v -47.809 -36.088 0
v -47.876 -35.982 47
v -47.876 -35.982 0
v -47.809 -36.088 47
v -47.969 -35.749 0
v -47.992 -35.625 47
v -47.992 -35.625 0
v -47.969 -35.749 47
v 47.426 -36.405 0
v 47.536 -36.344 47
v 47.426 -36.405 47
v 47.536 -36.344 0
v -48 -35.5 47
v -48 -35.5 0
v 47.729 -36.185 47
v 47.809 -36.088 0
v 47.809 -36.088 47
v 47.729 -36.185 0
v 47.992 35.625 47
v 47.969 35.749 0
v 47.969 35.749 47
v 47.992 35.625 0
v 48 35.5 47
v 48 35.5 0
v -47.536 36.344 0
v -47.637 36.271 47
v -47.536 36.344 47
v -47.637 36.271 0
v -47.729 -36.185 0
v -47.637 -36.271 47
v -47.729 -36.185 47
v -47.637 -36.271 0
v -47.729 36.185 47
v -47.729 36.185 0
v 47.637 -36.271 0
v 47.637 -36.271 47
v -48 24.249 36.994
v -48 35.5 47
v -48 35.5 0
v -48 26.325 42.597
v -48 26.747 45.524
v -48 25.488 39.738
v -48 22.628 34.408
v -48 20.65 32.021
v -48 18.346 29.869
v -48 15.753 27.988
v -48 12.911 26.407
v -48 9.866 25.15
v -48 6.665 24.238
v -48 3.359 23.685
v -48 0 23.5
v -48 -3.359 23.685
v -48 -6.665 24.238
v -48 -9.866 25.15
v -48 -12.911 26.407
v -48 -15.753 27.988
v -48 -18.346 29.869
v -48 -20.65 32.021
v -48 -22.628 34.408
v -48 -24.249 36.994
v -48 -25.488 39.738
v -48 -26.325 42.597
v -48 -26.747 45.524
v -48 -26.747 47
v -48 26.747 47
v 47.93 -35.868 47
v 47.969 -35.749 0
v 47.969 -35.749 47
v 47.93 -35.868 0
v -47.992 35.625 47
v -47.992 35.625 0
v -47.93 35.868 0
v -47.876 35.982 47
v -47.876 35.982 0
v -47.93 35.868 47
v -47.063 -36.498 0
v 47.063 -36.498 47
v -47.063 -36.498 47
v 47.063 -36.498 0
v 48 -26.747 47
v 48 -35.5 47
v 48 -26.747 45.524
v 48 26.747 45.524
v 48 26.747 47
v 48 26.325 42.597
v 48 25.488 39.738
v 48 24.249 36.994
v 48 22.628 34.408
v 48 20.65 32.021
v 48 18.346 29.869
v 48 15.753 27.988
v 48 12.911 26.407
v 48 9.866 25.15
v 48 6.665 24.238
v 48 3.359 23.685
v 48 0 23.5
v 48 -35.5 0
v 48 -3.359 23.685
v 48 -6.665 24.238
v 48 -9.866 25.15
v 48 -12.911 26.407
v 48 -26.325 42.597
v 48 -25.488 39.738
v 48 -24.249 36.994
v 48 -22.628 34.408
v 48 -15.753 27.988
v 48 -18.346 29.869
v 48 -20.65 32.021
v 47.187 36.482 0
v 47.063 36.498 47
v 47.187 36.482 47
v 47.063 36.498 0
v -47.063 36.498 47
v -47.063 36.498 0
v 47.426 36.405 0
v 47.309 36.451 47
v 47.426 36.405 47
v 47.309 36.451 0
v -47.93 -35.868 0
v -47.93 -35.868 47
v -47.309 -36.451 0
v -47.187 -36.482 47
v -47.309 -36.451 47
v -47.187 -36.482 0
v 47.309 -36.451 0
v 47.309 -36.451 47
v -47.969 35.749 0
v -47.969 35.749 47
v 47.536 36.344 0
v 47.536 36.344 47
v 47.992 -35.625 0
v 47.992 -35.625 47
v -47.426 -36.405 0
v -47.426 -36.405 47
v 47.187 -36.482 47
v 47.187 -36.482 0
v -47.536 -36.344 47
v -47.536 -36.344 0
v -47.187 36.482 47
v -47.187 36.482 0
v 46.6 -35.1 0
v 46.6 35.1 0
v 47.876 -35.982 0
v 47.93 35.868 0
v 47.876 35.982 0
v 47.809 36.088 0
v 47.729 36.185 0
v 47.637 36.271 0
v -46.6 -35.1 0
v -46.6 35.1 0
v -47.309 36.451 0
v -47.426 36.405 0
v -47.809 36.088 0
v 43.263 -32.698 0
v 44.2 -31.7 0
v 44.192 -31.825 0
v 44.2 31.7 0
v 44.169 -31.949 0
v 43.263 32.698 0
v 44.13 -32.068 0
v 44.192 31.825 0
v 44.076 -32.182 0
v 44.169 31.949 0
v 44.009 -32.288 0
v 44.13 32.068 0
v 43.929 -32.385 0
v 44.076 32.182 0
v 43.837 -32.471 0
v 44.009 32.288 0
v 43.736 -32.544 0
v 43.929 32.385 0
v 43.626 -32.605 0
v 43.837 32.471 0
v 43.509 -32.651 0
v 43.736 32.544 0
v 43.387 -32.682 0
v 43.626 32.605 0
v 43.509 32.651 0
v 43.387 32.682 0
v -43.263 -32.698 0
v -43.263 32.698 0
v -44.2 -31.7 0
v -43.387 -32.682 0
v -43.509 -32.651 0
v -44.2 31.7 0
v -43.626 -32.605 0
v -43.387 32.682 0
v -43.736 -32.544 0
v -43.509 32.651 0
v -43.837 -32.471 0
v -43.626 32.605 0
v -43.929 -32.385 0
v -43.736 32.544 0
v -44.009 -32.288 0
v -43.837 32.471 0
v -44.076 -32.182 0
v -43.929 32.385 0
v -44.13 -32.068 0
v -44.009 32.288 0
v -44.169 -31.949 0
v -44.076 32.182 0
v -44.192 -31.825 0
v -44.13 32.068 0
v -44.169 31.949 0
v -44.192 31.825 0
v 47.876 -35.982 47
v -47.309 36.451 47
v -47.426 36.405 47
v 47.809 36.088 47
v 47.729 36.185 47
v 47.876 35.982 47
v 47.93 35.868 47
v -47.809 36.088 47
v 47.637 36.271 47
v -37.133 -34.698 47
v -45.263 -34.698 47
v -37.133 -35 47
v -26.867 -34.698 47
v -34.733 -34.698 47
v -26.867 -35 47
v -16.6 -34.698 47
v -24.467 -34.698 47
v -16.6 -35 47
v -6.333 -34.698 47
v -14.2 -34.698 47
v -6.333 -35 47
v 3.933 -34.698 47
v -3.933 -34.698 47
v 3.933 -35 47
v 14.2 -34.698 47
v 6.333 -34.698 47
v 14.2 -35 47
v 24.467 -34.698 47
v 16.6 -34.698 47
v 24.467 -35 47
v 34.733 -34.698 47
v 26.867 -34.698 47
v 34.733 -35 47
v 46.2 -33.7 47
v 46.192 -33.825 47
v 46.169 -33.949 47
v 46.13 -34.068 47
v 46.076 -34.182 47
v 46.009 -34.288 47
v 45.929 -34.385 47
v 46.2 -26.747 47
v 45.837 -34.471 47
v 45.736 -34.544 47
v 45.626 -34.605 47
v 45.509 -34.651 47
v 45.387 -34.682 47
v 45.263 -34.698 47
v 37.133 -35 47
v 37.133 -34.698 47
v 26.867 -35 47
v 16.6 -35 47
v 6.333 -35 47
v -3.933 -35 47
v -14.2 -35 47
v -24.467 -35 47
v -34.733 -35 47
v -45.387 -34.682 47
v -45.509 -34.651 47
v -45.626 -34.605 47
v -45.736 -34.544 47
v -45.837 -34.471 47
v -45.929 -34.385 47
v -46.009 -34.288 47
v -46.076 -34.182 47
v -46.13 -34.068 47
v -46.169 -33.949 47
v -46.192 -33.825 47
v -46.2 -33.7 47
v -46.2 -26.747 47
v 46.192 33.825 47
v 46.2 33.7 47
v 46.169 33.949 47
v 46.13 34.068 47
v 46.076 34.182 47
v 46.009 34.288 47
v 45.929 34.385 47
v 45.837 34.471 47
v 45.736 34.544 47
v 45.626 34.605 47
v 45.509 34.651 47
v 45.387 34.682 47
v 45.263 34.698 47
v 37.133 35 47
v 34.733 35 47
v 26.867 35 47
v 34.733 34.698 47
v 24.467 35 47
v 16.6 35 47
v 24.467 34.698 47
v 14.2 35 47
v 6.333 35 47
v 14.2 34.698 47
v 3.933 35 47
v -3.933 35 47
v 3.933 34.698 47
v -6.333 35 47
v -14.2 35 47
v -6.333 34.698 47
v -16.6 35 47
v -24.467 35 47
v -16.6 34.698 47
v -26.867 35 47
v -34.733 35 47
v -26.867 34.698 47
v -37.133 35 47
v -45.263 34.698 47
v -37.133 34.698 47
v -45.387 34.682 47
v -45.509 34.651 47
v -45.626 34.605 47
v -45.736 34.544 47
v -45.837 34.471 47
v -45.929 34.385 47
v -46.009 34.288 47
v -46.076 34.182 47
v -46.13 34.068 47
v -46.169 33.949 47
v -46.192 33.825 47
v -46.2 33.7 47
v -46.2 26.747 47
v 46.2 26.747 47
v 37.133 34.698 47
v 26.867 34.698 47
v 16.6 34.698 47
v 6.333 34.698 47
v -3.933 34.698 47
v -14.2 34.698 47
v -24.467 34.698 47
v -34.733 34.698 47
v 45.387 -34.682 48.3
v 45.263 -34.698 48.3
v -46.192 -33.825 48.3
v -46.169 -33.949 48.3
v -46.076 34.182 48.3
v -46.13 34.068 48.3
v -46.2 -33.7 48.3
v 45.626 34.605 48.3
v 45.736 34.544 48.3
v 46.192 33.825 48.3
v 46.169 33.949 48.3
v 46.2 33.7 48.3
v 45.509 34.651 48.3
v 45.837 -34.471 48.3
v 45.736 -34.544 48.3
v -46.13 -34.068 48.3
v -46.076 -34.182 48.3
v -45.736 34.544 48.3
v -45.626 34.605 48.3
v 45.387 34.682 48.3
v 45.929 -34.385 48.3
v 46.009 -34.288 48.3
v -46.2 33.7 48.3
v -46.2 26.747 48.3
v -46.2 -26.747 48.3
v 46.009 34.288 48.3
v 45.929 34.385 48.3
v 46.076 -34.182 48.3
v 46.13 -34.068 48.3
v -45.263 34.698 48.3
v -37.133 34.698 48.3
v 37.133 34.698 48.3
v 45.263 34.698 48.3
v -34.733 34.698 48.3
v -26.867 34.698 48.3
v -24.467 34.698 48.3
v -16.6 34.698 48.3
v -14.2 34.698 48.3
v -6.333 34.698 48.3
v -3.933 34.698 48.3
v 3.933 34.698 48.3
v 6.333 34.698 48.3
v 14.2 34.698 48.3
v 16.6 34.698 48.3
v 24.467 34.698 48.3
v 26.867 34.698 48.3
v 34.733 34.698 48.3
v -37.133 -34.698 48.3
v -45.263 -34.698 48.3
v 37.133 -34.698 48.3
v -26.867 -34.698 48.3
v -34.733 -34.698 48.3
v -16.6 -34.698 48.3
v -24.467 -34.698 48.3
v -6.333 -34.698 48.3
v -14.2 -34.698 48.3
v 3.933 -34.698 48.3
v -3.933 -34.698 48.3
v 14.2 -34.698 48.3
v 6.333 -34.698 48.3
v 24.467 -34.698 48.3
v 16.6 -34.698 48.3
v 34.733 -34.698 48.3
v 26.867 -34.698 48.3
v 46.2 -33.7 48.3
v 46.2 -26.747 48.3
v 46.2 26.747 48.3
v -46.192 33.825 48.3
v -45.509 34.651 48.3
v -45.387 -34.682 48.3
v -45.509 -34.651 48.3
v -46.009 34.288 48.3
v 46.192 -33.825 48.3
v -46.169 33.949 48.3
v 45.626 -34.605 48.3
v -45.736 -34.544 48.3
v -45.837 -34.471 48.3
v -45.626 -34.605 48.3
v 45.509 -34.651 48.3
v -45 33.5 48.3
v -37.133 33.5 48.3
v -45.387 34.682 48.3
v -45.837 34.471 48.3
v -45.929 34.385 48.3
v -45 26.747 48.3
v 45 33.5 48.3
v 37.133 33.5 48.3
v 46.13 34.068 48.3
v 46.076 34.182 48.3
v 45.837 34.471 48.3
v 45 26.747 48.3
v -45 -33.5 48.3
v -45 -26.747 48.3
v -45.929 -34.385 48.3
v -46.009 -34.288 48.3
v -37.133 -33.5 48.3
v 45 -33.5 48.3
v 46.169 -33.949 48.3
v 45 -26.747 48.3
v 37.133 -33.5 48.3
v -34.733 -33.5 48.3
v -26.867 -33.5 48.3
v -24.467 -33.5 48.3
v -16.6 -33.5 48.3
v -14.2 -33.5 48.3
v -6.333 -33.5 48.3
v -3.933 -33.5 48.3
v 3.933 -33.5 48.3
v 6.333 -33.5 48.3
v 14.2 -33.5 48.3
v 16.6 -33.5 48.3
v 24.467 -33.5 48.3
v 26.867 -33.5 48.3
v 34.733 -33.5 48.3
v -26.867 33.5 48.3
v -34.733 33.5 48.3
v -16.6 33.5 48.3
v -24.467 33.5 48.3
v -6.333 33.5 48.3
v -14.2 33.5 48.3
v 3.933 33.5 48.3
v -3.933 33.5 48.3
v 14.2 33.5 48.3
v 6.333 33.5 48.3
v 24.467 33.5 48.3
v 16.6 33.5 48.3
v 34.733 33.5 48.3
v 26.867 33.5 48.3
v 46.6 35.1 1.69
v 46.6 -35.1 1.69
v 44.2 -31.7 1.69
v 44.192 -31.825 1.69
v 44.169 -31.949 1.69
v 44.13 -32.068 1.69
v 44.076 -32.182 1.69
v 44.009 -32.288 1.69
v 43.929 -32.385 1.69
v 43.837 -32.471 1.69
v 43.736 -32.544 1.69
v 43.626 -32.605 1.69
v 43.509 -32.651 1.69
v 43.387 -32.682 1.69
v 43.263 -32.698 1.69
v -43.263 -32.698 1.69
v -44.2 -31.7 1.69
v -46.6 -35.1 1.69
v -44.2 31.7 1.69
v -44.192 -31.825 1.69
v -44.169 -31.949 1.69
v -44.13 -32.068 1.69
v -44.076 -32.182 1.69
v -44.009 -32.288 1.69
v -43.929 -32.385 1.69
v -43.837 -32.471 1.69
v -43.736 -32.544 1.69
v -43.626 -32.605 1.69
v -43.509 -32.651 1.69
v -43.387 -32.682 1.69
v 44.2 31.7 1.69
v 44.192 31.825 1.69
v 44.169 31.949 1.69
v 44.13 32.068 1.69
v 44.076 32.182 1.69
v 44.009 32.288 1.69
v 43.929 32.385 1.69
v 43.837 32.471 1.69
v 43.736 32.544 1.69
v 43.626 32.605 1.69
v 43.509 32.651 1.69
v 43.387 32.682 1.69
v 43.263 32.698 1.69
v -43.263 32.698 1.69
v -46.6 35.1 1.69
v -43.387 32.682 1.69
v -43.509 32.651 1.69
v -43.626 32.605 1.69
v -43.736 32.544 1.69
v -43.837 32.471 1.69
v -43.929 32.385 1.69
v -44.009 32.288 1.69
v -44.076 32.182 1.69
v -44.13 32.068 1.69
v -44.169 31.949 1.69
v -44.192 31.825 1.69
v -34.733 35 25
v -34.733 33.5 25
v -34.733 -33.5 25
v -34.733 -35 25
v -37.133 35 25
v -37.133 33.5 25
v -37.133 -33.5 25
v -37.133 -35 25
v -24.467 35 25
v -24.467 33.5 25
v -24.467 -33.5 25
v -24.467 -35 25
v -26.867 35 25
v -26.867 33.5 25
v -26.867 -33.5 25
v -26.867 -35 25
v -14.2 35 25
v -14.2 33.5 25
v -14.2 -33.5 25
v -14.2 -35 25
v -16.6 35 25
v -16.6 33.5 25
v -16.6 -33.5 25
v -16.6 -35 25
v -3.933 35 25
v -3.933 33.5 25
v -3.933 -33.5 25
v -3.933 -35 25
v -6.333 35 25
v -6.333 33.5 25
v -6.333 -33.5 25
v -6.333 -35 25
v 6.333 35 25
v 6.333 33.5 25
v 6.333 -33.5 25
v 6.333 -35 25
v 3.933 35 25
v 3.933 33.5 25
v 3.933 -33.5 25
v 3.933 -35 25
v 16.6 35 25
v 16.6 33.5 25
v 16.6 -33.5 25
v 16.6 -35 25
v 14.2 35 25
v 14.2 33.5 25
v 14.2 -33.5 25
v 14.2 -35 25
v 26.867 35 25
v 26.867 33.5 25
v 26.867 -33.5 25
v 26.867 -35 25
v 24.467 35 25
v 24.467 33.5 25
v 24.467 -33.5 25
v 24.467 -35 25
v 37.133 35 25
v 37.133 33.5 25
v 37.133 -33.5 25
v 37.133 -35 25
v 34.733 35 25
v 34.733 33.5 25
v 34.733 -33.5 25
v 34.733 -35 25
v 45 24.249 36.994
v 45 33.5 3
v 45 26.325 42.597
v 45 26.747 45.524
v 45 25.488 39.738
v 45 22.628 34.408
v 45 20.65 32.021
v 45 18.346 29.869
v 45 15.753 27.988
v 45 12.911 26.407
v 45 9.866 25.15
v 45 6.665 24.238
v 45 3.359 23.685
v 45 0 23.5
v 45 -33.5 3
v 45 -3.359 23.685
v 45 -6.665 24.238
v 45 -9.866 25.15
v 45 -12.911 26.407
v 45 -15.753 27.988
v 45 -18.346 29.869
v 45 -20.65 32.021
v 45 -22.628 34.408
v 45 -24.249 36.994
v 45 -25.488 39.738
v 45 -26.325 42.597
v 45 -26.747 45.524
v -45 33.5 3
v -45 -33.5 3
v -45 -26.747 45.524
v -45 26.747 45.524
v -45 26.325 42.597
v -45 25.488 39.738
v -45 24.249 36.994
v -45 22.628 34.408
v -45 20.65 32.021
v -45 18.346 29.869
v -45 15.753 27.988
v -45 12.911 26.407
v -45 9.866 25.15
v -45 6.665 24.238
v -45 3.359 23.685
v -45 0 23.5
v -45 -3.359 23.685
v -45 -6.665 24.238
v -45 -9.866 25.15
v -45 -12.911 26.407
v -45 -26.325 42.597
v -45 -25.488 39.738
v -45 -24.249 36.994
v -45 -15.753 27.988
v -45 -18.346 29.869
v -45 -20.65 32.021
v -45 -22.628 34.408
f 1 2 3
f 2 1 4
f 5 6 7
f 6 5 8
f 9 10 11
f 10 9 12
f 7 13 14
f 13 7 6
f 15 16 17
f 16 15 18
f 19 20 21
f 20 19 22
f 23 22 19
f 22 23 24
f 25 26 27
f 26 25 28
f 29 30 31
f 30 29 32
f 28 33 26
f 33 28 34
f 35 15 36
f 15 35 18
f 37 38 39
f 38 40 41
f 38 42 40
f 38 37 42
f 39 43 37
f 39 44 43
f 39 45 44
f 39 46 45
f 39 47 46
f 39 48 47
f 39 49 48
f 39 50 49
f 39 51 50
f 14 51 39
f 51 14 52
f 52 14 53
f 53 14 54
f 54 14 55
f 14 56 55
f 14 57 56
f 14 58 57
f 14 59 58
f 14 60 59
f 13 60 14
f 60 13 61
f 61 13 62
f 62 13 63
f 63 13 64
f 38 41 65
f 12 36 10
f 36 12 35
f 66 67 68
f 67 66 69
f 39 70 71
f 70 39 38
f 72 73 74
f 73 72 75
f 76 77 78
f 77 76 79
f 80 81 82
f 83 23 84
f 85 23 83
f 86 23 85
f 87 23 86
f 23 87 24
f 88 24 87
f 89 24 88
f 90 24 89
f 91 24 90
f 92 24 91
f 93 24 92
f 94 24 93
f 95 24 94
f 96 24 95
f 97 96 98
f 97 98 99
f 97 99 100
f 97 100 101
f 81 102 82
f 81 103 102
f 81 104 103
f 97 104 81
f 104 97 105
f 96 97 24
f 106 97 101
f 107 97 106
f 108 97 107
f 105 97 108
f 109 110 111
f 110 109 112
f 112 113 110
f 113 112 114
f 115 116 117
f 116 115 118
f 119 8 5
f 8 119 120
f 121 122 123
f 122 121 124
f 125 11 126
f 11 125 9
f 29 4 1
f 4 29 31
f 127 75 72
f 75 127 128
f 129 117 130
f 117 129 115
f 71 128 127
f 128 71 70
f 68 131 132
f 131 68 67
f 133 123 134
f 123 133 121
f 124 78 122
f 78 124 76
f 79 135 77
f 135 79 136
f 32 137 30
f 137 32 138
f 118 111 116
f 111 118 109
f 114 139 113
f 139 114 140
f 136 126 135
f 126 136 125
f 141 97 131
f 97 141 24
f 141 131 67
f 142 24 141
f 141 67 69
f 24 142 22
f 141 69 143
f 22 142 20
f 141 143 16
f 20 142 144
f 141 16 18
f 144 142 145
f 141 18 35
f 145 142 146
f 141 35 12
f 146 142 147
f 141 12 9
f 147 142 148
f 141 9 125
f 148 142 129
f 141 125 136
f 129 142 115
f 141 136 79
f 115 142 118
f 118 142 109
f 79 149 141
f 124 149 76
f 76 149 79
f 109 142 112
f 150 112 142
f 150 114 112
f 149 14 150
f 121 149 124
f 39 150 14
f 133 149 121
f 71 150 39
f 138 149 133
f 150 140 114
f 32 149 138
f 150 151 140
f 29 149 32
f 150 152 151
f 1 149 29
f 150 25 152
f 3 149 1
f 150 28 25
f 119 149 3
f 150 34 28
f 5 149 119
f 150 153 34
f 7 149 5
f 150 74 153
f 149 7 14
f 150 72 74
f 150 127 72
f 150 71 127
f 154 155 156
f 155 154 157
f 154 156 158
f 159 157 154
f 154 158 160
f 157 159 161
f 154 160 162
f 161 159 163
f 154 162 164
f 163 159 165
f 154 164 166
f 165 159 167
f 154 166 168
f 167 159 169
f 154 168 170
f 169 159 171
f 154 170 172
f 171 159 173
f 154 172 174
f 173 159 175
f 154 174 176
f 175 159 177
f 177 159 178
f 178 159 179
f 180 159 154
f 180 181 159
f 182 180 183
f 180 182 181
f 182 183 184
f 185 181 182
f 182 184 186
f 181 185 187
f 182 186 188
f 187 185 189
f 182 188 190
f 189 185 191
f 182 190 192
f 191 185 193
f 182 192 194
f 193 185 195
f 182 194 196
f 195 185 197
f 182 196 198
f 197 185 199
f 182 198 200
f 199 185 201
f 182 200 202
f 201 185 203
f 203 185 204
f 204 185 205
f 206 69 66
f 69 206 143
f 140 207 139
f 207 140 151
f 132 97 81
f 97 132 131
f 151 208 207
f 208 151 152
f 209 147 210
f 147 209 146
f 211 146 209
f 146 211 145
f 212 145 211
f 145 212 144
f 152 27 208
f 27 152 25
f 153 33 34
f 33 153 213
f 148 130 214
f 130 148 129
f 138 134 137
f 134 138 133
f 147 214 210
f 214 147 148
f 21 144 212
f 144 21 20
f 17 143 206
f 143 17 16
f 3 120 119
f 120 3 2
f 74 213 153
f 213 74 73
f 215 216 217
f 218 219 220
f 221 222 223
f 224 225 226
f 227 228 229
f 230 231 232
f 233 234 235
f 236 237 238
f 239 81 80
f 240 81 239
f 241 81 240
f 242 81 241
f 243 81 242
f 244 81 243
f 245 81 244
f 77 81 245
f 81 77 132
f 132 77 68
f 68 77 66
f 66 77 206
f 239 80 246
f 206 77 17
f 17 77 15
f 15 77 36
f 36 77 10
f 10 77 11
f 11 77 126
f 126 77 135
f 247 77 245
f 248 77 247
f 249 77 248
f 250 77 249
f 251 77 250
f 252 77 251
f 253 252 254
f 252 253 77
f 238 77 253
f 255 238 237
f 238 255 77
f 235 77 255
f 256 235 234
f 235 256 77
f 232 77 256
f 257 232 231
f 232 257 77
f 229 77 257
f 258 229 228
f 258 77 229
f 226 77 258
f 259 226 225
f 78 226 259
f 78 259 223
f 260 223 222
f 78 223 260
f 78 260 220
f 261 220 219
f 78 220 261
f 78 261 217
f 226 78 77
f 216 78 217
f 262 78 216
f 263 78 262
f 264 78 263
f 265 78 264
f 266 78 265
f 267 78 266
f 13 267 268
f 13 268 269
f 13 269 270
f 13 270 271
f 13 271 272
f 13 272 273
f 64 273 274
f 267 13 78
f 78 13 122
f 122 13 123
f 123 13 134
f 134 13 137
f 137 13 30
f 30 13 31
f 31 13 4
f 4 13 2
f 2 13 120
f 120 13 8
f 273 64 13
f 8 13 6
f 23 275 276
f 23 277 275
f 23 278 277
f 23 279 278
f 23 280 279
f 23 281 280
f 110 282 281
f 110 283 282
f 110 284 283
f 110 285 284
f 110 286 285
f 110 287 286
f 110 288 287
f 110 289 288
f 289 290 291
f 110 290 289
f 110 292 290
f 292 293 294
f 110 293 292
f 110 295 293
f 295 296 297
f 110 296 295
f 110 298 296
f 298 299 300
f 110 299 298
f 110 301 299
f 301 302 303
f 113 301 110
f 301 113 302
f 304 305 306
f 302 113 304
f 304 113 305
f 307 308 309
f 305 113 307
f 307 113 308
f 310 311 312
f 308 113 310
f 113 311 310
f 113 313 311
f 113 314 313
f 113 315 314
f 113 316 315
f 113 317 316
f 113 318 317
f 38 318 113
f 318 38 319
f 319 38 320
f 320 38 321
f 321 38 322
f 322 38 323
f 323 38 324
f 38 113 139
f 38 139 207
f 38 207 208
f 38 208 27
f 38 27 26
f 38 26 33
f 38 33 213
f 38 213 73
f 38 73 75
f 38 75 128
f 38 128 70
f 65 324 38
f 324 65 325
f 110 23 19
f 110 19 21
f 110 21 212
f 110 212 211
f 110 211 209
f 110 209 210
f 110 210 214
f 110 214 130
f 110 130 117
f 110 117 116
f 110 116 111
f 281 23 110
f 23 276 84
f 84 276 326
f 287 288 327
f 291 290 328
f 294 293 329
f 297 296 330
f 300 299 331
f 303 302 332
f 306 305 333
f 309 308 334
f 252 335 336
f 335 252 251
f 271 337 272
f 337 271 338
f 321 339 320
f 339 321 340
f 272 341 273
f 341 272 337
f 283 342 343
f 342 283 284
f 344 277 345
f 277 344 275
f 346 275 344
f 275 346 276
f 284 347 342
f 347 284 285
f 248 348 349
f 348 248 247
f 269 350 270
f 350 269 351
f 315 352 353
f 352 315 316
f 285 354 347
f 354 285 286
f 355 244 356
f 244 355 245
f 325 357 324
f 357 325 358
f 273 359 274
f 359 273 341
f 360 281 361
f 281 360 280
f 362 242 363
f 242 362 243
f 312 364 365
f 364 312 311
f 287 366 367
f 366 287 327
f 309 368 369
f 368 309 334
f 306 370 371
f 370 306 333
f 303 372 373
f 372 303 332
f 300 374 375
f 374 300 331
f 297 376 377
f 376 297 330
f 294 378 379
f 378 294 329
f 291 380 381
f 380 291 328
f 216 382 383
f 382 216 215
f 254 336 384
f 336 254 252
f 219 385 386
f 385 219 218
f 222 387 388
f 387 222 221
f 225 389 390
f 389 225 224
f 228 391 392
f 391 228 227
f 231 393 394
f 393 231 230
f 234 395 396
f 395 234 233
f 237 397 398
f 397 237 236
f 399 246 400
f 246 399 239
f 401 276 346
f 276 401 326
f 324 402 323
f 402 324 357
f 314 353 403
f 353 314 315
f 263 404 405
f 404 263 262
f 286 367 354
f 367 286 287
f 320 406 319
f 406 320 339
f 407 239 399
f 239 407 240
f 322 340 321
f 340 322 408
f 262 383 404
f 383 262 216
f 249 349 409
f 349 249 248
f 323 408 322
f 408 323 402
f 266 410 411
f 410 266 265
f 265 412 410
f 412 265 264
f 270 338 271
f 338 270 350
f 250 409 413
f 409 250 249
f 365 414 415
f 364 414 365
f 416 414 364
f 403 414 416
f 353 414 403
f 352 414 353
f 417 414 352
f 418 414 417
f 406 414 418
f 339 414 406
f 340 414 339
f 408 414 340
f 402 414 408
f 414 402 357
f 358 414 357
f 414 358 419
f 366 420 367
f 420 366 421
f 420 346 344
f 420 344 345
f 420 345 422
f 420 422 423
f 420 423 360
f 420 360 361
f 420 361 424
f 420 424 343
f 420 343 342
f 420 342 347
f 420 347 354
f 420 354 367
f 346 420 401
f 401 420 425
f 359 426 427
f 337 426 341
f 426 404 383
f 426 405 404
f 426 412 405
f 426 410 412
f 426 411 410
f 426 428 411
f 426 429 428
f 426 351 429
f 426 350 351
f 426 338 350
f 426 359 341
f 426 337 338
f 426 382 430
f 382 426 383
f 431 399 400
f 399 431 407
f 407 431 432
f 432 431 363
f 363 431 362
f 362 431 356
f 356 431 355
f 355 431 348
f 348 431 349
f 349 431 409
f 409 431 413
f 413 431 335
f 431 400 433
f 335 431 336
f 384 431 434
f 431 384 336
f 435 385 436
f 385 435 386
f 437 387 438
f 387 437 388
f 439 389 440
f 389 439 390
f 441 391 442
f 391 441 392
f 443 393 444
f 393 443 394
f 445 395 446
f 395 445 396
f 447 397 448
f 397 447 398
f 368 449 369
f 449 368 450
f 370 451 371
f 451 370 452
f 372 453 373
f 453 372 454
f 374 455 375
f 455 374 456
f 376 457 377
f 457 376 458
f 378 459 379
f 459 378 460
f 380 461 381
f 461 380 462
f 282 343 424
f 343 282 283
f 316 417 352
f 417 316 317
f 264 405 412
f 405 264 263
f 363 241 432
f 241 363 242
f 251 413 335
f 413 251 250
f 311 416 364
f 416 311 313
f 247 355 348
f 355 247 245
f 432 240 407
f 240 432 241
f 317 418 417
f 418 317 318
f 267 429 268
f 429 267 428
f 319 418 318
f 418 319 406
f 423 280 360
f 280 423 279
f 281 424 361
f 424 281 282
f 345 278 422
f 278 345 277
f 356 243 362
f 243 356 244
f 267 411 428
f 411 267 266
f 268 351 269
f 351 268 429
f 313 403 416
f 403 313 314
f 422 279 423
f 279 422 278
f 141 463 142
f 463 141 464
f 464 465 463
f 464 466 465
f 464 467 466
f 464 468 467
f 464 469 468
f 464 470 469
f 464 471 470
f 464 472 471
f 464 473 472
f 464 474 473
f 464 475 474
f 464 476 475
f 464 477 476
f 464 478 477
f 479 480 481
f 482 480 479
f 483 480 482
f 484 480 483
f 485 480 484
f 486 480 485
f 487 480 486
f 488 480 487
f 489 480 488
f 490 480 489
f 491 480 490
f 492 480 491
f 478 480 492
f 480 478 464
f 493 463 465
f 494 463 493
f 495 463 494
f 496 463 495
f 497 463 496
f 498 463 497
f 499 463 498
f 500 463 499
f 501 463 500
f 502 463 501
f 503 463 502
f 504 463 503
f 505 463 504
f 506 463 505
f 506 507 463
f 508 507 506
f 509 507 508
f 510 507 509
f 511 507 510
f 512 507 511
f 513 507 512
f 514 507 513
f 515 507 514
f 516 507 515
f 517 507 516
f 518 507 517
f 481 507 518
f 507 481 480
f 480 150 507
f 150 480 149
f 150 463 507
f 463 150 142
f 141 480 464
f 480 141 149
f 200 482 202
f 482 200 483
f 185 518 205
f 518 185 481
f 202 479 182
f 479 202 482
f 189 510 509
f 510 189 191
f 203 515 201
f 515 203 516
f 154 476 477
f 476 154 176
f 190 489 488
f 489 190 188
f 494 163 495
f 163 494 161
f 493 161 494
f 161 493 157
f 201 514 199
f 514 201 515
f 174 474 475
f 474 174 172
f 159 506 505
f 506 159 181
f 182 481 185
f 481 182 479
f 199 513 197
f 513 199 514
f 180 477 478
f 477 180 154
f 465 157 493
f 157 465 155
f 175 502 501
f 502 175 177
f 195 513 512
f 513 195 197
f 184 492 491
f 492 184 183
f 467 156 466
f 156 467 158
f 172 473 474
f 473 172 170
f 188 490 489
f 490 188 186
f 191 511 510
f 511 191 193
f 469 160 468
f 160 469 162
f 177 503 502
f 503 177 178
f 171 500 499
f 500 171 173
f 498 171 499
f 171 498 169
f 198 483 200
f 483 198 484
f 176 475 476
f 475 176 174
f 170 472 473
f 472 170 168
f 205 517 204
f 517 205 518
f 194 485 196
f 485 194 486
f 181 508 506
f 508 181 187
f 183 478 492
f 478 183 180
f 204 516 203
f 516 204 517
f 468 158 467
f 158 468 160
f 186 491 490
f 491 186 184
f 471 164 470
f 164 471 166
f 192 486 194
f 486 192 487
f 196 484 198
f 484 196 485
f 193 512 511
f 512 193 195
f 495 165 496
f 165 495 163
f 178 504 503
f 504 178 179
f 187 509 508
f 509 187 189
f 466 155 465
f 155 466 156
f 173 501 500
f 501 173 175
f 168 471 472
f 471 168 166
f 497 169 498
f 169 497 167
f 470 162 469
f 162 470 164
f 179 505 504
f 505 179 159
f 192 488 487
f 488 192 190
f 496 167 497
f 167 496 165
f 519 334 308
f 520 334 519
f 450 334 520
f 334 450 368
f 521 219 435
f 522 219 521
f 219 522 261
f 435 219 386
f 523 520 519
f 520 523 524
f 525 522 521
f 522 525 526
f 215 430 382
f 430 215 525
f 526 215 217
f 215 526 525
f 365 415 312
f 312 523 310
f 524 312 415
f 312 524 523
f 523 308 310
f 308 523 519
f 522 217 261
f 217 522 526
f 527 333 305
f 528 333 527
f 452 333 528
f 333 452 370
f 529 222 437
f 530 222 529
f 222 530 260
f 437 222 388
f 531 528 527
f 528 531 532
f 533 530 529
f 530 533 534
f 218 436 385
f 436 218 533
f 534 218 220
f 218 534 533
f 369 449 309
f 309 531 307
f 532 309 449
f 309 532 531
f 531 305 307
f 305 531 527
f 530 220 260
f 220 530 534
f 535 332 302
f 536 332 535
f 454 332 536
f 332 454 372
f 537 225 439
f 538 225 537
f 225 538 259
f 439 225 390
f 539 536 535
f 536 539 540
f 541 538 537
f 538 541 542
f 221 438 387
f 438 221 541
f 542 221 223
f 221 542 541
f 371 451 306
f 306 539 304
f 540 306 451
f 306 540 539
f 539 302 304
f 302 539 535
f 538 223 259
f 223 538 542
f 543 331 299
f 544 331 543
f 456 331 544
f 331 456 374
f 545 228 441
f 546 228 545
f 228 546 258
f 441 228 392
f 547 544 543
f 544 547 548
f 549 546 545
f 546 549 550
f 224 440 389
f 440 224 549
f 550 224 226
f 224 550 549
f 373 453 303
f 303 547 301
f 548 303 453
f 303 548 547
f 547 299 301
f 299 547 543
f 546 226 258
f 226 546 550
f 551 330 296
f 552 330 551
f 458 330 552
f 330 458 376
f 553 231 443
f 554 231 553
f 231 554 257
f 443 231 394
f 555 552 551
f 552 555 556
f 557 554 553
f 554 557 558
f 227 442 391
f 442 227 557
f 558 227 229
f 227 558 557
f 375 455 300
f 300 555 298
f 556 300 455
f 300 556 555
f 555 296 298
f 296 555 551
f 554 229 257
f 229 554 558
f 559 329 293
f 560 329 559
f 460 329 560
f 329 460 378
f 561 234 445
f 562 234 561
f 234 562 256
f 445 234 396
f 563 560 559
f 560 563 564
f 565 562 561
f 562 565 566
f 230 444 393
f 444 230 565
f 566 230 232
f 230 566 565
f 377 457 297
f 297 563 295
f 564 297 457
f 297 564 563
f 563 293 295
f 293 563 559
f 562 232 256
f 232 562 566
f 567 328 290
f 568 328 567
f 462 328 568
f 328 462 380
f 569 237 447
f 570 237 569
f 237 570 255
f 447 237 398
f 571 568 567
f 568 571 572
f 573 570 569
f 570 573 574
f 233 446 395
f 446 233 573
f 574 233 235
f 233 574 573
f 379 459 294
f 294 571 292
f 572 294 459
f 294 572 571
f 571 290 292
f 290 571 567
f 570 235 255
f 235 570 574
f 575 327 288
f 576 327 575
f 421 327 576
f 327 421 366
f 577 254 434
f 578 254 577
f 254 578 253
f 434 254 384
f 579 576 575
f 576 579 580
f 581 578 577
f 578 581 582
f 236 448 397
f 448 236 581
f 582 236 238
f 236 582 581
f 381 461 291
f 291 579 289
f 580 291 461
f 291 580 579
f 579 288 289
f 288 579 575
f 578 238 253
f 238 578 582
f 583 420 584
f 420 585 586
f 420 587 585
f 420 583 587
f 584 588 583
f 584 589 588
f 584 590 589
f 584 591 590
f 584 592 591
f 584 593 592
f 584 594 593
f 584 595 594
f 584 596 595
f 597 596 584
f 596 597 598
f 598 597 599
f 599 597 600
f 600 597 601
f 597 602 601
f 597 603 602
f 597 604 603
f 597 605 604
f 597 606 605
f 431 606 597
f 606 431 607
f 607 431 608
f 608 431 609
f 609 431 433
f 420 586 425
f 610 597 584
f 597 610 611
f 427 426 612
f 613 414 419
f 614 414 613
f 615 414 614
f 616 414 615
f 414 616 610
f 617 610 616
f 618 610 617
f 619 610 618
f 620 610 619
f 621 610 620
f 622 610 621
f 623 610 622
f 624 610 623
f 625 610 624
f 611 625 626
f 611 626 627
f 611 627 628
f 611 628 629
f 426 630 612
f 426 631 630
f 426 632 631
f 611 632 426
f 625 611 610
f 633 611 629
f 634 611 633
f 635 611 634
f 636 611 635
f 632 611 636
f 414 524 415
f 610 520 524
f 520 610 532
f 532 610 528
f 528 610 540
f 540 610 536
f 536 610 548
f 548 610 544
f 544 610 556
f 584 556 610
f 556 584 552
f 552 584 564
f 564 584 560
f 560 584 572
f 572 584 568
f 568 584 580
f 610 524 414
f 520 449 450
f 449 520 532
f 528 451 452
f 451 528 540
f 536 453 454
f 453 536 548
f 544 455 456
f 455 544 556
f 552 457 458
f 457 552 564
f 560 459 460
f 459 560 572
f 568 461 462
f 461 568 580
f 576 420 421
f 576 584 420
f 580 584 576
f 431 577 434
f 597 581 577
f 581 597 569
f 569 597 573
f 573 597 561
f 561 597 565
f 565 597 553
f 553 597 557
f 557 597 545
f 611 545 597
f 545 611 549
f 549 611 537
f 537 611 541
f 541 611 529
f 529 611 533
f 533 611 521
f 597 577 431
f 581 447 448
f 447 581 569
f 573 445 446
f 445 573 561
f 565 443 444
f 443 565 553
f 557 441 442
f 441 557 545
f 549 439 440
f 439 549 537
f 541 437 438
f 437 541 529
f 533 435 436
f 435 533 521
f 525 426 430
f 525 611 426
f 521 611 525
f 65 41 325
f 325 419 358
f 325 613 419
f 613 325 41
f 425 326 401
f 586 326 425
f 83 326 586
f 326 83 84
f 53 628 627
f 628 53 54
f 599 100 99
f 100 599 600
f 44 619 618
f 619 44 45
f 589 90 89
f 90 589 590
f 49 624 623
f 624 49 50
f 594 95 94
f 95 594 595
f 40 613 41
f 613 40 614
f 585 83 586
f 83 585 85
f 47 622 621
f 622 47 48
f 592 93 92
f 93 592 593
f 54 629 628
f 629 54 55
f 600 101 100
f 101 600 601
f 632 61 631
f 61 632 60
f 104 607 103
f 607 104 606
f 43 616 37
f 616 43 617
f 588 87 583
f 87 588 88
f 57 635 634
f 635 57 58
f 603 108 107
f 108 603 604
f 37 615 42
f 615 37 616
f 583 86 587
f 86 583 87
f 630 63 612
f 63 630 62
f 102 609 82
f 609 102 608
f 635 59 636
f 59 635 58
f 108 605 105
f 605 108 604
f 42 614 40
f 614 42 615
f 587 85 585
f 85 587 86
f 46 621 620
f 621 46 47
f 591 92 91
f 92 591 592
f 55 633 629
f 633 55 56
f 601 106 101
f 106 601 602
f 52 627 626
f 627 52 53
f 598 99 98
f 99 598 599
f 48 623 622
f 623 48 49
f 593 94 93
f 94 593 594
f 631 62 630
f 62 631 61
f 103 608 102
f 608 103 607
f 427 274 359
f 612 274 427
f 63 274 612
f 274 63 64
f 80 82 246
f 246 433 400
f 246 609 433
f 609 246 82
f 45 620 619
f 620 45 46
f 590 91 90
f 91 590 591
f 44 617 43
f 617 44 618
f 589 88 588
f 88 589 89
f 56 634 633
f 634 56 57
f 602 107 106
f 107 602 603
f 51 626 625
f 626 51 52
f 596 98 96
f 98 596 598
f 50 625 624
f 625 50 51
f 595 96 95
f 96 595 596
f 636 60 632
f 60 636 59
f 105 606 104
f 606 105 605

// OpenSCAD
// Which one would you like to see?
part = "first"; // [first:Box Only,second:Divider Only]




box_length = 96; //box length
box_width = 73; //box width
box_height = 47; //box height

//wall thickness in mm
box_thickness = 3; //box wall thickness

//corner rounded radius in mm
box_rounded_corner = 1; //rounded corner radius

//extra space on each side for divider slots
tolerance = 0.2; //extra space on divider slots

//extra space on the stacking rim (bottom)
rim_tolerance = 0.4; //extra space on the rim

//shortens the divider height in mm
div_height_tolerance = 2;


div_length = box_width - (2 * box_thickness) - (2 * tolerance);
div_height = box_height - box_thickness - div_height_tolerance; //divider height
div_thickness = 2; //divider thickness

//the number of sections, not the number of dividers 
number_of_slots = 9;

//Enable stacking?
stacking = true; // [true,false]

//Cut circles in the box ends?
cut_ends = true; // [true,false]

//Cut circles in the divider ends?
div_cut_ends = "top"; // [top,bottom,both]

stack_rim_thickness = (box_thickness < 3) ? box_thickness / 2 : 1.2; //either half the wall thickness or 1.2
	
//the lower rim groove is 0.4mm deeper than this. do not exceed your wall thickness!
upper_rim_height = 1.3;
lower_rim_height = upper_rim_height + 0.4;





//divider();
//build_box();

print_part();


module print_part()
 {
    if (part == "first") build_box();
    if (part == "second") divider();
 }

module lower_rim()
{
	translate([0,0,0])
		difference()
		{
			translate([0,0,lower_rim_height/2-.01])
			cube([box_length - ((box_thickness - stack_rim_thickness) * 2) + rim_tolerance * 2,box_width - (box_thickness - stack_rim_thickness) * 2 + rim_tolerance*2 ,lower_rim_height], center = true);
			roundedRect([box_length - ((box_thickness - stack_rim_thickness) * 2) - rim_tolerance * 4 - stack_rim_thickness * 2,box_width - (box_thickness - stack_rim_thickness) * 2 - rim_tolerance*4 - stack_rim_thickness * 2,lower_rim_height+.1], box_rounded_corner, $fn=50);
		}


}
module upper_rim()
{
	translate([0,0,box_height])
		roundedRect([box_length - (box_thickness - stack_rim_thickness) * 2,box_width -  (box_thickness - stack_rim_thickness) * 2,upper_rim_height], box_rounded_corner, $fn=50);
}

module main_cube()
{
	difference()
	{
		union()
		{
			roundedRect([box_length, box_width, box_height], box_rounded_corner, $fn=50);
			if(stacking) upper_rim();
		}
	
		if(stacking) lower_rim();
	}
		
	
	
}

module build_box ()
{
	slot_thickness = div_thickness + (tolerance * 2);
	slot_spacing = ((box_length - (box_thickness * 2)) - ((number_of_slots - 1) * slot_thickness)) / number_of_slots;
	$fn = 50;
	stack_rim_thickness = (box_thickness < 3) ? box_thickness / 2 : 1.5;
		
	difference() {

		
		main_cube();
		

		translate ([0,0,box_thickness+box_height/2]) 
			cube ([box_length - (2 * box_thickness), box_width - (2 * box_thickness), box_height], center = true);
		if (cut_ends)
		{
			hull()
			{
				translate([0,0,box_height])
					rotate(a=[0,90,0])
						scale(v=[box_height,(box_width - (box_thickness * 2))*.8,1])
							cylinder (h = box_length+2, r = .5, $fn = 50, center = true);
				translate([0,0,box_height+50])
					rotate(a=[0,90,0])
						scale(v=[box_height,(box_width - (box_thickness * 2))*.8,1])
							cylinder (h = box_length+2, r = .5, $fn = 50, center = true);
			}
		}
		
		if (number_of_slots > 1)
		{
			translate([-((number_of_slots-2) * (slot_thickness + slot_spacing))/2,0,box_height])
				for ( i = [0 : number_of_slots-2] )
				{
					translate([i * (slot_thickness + slot_spacing),0,0])
					cube ([slot_thickness, box_width - box_thickness, (box_height - box_thickness)], center = true); 
				}
		}
	}

}

module divider ()
{
	tab_length = (box_thickness / 2) - tolerance;
	tab_width = div_thickness;
	tab_height = ((box_height - box_thickness) / 2) - (box_height - box_thickness - div_height);
	
	translate([0,0,(div_height / 2) + box_thickness + div_height_tolerance])
	difference() {
	
		union() {
			cube ([div_thickness, div_length, div_height], center = true);
				translate([-div_thickness / 2, div_length / 2, (div_height / 2) - tab_height])	
					cube ([tab_width, tab_length, tab_height ]);
			mirror ([0,1,0])
				translate([-div_thickness / 2, div_length / 2, (div_height / 2) - tab_height])	
					cube ([tab_width, tab_length, tab_height ]);
			}
		
		if ((div_cut_ends == "top") || (div_cut_ends == "both"))
		translate([0,0,div_height / 2 ])
			rotate(a=[0,90,0])
				scale(v=[div_height * 0.7,(div_length * 0.6),1])
					cylinder (h = div_thickness+2, r = .5, $fn = 50, center = true);

	if ((div_cut_ends == "bottom") || (div_cut_ends == "both"))
		translate([0,0,-div_height / 2 ])
			rotate(a=[0,90,0])
				scale(v=[div_height * 0.7,(div_length * 0.6),1])
					cylinder (h = div_thickness+2, r = .5, $fn = 50, center = true);
		}

	}

module roundedRect(size, radius)
{
	x = size[0];
	y = size[1];
	z = size[2];

	linear_extrude(height=z)
	hull()
	{
		// place 4 circles in the corners, with the given radius
		translate([(-x/2)+(radius), (-y/2)+(radius), 0])
		circle(r=radius);
	
		translate([(x/2)-(radius), (-y/2)+(radius), 0])
		circle(r=radius);
	
		translate([(-x/2)+(radius), (y/2)-(radius), 0])
		circle(r=radius);
	
		translate([(x/2)-(radius), (y/2)-(radius), 0])
		circle(r=radius);
	}
}
